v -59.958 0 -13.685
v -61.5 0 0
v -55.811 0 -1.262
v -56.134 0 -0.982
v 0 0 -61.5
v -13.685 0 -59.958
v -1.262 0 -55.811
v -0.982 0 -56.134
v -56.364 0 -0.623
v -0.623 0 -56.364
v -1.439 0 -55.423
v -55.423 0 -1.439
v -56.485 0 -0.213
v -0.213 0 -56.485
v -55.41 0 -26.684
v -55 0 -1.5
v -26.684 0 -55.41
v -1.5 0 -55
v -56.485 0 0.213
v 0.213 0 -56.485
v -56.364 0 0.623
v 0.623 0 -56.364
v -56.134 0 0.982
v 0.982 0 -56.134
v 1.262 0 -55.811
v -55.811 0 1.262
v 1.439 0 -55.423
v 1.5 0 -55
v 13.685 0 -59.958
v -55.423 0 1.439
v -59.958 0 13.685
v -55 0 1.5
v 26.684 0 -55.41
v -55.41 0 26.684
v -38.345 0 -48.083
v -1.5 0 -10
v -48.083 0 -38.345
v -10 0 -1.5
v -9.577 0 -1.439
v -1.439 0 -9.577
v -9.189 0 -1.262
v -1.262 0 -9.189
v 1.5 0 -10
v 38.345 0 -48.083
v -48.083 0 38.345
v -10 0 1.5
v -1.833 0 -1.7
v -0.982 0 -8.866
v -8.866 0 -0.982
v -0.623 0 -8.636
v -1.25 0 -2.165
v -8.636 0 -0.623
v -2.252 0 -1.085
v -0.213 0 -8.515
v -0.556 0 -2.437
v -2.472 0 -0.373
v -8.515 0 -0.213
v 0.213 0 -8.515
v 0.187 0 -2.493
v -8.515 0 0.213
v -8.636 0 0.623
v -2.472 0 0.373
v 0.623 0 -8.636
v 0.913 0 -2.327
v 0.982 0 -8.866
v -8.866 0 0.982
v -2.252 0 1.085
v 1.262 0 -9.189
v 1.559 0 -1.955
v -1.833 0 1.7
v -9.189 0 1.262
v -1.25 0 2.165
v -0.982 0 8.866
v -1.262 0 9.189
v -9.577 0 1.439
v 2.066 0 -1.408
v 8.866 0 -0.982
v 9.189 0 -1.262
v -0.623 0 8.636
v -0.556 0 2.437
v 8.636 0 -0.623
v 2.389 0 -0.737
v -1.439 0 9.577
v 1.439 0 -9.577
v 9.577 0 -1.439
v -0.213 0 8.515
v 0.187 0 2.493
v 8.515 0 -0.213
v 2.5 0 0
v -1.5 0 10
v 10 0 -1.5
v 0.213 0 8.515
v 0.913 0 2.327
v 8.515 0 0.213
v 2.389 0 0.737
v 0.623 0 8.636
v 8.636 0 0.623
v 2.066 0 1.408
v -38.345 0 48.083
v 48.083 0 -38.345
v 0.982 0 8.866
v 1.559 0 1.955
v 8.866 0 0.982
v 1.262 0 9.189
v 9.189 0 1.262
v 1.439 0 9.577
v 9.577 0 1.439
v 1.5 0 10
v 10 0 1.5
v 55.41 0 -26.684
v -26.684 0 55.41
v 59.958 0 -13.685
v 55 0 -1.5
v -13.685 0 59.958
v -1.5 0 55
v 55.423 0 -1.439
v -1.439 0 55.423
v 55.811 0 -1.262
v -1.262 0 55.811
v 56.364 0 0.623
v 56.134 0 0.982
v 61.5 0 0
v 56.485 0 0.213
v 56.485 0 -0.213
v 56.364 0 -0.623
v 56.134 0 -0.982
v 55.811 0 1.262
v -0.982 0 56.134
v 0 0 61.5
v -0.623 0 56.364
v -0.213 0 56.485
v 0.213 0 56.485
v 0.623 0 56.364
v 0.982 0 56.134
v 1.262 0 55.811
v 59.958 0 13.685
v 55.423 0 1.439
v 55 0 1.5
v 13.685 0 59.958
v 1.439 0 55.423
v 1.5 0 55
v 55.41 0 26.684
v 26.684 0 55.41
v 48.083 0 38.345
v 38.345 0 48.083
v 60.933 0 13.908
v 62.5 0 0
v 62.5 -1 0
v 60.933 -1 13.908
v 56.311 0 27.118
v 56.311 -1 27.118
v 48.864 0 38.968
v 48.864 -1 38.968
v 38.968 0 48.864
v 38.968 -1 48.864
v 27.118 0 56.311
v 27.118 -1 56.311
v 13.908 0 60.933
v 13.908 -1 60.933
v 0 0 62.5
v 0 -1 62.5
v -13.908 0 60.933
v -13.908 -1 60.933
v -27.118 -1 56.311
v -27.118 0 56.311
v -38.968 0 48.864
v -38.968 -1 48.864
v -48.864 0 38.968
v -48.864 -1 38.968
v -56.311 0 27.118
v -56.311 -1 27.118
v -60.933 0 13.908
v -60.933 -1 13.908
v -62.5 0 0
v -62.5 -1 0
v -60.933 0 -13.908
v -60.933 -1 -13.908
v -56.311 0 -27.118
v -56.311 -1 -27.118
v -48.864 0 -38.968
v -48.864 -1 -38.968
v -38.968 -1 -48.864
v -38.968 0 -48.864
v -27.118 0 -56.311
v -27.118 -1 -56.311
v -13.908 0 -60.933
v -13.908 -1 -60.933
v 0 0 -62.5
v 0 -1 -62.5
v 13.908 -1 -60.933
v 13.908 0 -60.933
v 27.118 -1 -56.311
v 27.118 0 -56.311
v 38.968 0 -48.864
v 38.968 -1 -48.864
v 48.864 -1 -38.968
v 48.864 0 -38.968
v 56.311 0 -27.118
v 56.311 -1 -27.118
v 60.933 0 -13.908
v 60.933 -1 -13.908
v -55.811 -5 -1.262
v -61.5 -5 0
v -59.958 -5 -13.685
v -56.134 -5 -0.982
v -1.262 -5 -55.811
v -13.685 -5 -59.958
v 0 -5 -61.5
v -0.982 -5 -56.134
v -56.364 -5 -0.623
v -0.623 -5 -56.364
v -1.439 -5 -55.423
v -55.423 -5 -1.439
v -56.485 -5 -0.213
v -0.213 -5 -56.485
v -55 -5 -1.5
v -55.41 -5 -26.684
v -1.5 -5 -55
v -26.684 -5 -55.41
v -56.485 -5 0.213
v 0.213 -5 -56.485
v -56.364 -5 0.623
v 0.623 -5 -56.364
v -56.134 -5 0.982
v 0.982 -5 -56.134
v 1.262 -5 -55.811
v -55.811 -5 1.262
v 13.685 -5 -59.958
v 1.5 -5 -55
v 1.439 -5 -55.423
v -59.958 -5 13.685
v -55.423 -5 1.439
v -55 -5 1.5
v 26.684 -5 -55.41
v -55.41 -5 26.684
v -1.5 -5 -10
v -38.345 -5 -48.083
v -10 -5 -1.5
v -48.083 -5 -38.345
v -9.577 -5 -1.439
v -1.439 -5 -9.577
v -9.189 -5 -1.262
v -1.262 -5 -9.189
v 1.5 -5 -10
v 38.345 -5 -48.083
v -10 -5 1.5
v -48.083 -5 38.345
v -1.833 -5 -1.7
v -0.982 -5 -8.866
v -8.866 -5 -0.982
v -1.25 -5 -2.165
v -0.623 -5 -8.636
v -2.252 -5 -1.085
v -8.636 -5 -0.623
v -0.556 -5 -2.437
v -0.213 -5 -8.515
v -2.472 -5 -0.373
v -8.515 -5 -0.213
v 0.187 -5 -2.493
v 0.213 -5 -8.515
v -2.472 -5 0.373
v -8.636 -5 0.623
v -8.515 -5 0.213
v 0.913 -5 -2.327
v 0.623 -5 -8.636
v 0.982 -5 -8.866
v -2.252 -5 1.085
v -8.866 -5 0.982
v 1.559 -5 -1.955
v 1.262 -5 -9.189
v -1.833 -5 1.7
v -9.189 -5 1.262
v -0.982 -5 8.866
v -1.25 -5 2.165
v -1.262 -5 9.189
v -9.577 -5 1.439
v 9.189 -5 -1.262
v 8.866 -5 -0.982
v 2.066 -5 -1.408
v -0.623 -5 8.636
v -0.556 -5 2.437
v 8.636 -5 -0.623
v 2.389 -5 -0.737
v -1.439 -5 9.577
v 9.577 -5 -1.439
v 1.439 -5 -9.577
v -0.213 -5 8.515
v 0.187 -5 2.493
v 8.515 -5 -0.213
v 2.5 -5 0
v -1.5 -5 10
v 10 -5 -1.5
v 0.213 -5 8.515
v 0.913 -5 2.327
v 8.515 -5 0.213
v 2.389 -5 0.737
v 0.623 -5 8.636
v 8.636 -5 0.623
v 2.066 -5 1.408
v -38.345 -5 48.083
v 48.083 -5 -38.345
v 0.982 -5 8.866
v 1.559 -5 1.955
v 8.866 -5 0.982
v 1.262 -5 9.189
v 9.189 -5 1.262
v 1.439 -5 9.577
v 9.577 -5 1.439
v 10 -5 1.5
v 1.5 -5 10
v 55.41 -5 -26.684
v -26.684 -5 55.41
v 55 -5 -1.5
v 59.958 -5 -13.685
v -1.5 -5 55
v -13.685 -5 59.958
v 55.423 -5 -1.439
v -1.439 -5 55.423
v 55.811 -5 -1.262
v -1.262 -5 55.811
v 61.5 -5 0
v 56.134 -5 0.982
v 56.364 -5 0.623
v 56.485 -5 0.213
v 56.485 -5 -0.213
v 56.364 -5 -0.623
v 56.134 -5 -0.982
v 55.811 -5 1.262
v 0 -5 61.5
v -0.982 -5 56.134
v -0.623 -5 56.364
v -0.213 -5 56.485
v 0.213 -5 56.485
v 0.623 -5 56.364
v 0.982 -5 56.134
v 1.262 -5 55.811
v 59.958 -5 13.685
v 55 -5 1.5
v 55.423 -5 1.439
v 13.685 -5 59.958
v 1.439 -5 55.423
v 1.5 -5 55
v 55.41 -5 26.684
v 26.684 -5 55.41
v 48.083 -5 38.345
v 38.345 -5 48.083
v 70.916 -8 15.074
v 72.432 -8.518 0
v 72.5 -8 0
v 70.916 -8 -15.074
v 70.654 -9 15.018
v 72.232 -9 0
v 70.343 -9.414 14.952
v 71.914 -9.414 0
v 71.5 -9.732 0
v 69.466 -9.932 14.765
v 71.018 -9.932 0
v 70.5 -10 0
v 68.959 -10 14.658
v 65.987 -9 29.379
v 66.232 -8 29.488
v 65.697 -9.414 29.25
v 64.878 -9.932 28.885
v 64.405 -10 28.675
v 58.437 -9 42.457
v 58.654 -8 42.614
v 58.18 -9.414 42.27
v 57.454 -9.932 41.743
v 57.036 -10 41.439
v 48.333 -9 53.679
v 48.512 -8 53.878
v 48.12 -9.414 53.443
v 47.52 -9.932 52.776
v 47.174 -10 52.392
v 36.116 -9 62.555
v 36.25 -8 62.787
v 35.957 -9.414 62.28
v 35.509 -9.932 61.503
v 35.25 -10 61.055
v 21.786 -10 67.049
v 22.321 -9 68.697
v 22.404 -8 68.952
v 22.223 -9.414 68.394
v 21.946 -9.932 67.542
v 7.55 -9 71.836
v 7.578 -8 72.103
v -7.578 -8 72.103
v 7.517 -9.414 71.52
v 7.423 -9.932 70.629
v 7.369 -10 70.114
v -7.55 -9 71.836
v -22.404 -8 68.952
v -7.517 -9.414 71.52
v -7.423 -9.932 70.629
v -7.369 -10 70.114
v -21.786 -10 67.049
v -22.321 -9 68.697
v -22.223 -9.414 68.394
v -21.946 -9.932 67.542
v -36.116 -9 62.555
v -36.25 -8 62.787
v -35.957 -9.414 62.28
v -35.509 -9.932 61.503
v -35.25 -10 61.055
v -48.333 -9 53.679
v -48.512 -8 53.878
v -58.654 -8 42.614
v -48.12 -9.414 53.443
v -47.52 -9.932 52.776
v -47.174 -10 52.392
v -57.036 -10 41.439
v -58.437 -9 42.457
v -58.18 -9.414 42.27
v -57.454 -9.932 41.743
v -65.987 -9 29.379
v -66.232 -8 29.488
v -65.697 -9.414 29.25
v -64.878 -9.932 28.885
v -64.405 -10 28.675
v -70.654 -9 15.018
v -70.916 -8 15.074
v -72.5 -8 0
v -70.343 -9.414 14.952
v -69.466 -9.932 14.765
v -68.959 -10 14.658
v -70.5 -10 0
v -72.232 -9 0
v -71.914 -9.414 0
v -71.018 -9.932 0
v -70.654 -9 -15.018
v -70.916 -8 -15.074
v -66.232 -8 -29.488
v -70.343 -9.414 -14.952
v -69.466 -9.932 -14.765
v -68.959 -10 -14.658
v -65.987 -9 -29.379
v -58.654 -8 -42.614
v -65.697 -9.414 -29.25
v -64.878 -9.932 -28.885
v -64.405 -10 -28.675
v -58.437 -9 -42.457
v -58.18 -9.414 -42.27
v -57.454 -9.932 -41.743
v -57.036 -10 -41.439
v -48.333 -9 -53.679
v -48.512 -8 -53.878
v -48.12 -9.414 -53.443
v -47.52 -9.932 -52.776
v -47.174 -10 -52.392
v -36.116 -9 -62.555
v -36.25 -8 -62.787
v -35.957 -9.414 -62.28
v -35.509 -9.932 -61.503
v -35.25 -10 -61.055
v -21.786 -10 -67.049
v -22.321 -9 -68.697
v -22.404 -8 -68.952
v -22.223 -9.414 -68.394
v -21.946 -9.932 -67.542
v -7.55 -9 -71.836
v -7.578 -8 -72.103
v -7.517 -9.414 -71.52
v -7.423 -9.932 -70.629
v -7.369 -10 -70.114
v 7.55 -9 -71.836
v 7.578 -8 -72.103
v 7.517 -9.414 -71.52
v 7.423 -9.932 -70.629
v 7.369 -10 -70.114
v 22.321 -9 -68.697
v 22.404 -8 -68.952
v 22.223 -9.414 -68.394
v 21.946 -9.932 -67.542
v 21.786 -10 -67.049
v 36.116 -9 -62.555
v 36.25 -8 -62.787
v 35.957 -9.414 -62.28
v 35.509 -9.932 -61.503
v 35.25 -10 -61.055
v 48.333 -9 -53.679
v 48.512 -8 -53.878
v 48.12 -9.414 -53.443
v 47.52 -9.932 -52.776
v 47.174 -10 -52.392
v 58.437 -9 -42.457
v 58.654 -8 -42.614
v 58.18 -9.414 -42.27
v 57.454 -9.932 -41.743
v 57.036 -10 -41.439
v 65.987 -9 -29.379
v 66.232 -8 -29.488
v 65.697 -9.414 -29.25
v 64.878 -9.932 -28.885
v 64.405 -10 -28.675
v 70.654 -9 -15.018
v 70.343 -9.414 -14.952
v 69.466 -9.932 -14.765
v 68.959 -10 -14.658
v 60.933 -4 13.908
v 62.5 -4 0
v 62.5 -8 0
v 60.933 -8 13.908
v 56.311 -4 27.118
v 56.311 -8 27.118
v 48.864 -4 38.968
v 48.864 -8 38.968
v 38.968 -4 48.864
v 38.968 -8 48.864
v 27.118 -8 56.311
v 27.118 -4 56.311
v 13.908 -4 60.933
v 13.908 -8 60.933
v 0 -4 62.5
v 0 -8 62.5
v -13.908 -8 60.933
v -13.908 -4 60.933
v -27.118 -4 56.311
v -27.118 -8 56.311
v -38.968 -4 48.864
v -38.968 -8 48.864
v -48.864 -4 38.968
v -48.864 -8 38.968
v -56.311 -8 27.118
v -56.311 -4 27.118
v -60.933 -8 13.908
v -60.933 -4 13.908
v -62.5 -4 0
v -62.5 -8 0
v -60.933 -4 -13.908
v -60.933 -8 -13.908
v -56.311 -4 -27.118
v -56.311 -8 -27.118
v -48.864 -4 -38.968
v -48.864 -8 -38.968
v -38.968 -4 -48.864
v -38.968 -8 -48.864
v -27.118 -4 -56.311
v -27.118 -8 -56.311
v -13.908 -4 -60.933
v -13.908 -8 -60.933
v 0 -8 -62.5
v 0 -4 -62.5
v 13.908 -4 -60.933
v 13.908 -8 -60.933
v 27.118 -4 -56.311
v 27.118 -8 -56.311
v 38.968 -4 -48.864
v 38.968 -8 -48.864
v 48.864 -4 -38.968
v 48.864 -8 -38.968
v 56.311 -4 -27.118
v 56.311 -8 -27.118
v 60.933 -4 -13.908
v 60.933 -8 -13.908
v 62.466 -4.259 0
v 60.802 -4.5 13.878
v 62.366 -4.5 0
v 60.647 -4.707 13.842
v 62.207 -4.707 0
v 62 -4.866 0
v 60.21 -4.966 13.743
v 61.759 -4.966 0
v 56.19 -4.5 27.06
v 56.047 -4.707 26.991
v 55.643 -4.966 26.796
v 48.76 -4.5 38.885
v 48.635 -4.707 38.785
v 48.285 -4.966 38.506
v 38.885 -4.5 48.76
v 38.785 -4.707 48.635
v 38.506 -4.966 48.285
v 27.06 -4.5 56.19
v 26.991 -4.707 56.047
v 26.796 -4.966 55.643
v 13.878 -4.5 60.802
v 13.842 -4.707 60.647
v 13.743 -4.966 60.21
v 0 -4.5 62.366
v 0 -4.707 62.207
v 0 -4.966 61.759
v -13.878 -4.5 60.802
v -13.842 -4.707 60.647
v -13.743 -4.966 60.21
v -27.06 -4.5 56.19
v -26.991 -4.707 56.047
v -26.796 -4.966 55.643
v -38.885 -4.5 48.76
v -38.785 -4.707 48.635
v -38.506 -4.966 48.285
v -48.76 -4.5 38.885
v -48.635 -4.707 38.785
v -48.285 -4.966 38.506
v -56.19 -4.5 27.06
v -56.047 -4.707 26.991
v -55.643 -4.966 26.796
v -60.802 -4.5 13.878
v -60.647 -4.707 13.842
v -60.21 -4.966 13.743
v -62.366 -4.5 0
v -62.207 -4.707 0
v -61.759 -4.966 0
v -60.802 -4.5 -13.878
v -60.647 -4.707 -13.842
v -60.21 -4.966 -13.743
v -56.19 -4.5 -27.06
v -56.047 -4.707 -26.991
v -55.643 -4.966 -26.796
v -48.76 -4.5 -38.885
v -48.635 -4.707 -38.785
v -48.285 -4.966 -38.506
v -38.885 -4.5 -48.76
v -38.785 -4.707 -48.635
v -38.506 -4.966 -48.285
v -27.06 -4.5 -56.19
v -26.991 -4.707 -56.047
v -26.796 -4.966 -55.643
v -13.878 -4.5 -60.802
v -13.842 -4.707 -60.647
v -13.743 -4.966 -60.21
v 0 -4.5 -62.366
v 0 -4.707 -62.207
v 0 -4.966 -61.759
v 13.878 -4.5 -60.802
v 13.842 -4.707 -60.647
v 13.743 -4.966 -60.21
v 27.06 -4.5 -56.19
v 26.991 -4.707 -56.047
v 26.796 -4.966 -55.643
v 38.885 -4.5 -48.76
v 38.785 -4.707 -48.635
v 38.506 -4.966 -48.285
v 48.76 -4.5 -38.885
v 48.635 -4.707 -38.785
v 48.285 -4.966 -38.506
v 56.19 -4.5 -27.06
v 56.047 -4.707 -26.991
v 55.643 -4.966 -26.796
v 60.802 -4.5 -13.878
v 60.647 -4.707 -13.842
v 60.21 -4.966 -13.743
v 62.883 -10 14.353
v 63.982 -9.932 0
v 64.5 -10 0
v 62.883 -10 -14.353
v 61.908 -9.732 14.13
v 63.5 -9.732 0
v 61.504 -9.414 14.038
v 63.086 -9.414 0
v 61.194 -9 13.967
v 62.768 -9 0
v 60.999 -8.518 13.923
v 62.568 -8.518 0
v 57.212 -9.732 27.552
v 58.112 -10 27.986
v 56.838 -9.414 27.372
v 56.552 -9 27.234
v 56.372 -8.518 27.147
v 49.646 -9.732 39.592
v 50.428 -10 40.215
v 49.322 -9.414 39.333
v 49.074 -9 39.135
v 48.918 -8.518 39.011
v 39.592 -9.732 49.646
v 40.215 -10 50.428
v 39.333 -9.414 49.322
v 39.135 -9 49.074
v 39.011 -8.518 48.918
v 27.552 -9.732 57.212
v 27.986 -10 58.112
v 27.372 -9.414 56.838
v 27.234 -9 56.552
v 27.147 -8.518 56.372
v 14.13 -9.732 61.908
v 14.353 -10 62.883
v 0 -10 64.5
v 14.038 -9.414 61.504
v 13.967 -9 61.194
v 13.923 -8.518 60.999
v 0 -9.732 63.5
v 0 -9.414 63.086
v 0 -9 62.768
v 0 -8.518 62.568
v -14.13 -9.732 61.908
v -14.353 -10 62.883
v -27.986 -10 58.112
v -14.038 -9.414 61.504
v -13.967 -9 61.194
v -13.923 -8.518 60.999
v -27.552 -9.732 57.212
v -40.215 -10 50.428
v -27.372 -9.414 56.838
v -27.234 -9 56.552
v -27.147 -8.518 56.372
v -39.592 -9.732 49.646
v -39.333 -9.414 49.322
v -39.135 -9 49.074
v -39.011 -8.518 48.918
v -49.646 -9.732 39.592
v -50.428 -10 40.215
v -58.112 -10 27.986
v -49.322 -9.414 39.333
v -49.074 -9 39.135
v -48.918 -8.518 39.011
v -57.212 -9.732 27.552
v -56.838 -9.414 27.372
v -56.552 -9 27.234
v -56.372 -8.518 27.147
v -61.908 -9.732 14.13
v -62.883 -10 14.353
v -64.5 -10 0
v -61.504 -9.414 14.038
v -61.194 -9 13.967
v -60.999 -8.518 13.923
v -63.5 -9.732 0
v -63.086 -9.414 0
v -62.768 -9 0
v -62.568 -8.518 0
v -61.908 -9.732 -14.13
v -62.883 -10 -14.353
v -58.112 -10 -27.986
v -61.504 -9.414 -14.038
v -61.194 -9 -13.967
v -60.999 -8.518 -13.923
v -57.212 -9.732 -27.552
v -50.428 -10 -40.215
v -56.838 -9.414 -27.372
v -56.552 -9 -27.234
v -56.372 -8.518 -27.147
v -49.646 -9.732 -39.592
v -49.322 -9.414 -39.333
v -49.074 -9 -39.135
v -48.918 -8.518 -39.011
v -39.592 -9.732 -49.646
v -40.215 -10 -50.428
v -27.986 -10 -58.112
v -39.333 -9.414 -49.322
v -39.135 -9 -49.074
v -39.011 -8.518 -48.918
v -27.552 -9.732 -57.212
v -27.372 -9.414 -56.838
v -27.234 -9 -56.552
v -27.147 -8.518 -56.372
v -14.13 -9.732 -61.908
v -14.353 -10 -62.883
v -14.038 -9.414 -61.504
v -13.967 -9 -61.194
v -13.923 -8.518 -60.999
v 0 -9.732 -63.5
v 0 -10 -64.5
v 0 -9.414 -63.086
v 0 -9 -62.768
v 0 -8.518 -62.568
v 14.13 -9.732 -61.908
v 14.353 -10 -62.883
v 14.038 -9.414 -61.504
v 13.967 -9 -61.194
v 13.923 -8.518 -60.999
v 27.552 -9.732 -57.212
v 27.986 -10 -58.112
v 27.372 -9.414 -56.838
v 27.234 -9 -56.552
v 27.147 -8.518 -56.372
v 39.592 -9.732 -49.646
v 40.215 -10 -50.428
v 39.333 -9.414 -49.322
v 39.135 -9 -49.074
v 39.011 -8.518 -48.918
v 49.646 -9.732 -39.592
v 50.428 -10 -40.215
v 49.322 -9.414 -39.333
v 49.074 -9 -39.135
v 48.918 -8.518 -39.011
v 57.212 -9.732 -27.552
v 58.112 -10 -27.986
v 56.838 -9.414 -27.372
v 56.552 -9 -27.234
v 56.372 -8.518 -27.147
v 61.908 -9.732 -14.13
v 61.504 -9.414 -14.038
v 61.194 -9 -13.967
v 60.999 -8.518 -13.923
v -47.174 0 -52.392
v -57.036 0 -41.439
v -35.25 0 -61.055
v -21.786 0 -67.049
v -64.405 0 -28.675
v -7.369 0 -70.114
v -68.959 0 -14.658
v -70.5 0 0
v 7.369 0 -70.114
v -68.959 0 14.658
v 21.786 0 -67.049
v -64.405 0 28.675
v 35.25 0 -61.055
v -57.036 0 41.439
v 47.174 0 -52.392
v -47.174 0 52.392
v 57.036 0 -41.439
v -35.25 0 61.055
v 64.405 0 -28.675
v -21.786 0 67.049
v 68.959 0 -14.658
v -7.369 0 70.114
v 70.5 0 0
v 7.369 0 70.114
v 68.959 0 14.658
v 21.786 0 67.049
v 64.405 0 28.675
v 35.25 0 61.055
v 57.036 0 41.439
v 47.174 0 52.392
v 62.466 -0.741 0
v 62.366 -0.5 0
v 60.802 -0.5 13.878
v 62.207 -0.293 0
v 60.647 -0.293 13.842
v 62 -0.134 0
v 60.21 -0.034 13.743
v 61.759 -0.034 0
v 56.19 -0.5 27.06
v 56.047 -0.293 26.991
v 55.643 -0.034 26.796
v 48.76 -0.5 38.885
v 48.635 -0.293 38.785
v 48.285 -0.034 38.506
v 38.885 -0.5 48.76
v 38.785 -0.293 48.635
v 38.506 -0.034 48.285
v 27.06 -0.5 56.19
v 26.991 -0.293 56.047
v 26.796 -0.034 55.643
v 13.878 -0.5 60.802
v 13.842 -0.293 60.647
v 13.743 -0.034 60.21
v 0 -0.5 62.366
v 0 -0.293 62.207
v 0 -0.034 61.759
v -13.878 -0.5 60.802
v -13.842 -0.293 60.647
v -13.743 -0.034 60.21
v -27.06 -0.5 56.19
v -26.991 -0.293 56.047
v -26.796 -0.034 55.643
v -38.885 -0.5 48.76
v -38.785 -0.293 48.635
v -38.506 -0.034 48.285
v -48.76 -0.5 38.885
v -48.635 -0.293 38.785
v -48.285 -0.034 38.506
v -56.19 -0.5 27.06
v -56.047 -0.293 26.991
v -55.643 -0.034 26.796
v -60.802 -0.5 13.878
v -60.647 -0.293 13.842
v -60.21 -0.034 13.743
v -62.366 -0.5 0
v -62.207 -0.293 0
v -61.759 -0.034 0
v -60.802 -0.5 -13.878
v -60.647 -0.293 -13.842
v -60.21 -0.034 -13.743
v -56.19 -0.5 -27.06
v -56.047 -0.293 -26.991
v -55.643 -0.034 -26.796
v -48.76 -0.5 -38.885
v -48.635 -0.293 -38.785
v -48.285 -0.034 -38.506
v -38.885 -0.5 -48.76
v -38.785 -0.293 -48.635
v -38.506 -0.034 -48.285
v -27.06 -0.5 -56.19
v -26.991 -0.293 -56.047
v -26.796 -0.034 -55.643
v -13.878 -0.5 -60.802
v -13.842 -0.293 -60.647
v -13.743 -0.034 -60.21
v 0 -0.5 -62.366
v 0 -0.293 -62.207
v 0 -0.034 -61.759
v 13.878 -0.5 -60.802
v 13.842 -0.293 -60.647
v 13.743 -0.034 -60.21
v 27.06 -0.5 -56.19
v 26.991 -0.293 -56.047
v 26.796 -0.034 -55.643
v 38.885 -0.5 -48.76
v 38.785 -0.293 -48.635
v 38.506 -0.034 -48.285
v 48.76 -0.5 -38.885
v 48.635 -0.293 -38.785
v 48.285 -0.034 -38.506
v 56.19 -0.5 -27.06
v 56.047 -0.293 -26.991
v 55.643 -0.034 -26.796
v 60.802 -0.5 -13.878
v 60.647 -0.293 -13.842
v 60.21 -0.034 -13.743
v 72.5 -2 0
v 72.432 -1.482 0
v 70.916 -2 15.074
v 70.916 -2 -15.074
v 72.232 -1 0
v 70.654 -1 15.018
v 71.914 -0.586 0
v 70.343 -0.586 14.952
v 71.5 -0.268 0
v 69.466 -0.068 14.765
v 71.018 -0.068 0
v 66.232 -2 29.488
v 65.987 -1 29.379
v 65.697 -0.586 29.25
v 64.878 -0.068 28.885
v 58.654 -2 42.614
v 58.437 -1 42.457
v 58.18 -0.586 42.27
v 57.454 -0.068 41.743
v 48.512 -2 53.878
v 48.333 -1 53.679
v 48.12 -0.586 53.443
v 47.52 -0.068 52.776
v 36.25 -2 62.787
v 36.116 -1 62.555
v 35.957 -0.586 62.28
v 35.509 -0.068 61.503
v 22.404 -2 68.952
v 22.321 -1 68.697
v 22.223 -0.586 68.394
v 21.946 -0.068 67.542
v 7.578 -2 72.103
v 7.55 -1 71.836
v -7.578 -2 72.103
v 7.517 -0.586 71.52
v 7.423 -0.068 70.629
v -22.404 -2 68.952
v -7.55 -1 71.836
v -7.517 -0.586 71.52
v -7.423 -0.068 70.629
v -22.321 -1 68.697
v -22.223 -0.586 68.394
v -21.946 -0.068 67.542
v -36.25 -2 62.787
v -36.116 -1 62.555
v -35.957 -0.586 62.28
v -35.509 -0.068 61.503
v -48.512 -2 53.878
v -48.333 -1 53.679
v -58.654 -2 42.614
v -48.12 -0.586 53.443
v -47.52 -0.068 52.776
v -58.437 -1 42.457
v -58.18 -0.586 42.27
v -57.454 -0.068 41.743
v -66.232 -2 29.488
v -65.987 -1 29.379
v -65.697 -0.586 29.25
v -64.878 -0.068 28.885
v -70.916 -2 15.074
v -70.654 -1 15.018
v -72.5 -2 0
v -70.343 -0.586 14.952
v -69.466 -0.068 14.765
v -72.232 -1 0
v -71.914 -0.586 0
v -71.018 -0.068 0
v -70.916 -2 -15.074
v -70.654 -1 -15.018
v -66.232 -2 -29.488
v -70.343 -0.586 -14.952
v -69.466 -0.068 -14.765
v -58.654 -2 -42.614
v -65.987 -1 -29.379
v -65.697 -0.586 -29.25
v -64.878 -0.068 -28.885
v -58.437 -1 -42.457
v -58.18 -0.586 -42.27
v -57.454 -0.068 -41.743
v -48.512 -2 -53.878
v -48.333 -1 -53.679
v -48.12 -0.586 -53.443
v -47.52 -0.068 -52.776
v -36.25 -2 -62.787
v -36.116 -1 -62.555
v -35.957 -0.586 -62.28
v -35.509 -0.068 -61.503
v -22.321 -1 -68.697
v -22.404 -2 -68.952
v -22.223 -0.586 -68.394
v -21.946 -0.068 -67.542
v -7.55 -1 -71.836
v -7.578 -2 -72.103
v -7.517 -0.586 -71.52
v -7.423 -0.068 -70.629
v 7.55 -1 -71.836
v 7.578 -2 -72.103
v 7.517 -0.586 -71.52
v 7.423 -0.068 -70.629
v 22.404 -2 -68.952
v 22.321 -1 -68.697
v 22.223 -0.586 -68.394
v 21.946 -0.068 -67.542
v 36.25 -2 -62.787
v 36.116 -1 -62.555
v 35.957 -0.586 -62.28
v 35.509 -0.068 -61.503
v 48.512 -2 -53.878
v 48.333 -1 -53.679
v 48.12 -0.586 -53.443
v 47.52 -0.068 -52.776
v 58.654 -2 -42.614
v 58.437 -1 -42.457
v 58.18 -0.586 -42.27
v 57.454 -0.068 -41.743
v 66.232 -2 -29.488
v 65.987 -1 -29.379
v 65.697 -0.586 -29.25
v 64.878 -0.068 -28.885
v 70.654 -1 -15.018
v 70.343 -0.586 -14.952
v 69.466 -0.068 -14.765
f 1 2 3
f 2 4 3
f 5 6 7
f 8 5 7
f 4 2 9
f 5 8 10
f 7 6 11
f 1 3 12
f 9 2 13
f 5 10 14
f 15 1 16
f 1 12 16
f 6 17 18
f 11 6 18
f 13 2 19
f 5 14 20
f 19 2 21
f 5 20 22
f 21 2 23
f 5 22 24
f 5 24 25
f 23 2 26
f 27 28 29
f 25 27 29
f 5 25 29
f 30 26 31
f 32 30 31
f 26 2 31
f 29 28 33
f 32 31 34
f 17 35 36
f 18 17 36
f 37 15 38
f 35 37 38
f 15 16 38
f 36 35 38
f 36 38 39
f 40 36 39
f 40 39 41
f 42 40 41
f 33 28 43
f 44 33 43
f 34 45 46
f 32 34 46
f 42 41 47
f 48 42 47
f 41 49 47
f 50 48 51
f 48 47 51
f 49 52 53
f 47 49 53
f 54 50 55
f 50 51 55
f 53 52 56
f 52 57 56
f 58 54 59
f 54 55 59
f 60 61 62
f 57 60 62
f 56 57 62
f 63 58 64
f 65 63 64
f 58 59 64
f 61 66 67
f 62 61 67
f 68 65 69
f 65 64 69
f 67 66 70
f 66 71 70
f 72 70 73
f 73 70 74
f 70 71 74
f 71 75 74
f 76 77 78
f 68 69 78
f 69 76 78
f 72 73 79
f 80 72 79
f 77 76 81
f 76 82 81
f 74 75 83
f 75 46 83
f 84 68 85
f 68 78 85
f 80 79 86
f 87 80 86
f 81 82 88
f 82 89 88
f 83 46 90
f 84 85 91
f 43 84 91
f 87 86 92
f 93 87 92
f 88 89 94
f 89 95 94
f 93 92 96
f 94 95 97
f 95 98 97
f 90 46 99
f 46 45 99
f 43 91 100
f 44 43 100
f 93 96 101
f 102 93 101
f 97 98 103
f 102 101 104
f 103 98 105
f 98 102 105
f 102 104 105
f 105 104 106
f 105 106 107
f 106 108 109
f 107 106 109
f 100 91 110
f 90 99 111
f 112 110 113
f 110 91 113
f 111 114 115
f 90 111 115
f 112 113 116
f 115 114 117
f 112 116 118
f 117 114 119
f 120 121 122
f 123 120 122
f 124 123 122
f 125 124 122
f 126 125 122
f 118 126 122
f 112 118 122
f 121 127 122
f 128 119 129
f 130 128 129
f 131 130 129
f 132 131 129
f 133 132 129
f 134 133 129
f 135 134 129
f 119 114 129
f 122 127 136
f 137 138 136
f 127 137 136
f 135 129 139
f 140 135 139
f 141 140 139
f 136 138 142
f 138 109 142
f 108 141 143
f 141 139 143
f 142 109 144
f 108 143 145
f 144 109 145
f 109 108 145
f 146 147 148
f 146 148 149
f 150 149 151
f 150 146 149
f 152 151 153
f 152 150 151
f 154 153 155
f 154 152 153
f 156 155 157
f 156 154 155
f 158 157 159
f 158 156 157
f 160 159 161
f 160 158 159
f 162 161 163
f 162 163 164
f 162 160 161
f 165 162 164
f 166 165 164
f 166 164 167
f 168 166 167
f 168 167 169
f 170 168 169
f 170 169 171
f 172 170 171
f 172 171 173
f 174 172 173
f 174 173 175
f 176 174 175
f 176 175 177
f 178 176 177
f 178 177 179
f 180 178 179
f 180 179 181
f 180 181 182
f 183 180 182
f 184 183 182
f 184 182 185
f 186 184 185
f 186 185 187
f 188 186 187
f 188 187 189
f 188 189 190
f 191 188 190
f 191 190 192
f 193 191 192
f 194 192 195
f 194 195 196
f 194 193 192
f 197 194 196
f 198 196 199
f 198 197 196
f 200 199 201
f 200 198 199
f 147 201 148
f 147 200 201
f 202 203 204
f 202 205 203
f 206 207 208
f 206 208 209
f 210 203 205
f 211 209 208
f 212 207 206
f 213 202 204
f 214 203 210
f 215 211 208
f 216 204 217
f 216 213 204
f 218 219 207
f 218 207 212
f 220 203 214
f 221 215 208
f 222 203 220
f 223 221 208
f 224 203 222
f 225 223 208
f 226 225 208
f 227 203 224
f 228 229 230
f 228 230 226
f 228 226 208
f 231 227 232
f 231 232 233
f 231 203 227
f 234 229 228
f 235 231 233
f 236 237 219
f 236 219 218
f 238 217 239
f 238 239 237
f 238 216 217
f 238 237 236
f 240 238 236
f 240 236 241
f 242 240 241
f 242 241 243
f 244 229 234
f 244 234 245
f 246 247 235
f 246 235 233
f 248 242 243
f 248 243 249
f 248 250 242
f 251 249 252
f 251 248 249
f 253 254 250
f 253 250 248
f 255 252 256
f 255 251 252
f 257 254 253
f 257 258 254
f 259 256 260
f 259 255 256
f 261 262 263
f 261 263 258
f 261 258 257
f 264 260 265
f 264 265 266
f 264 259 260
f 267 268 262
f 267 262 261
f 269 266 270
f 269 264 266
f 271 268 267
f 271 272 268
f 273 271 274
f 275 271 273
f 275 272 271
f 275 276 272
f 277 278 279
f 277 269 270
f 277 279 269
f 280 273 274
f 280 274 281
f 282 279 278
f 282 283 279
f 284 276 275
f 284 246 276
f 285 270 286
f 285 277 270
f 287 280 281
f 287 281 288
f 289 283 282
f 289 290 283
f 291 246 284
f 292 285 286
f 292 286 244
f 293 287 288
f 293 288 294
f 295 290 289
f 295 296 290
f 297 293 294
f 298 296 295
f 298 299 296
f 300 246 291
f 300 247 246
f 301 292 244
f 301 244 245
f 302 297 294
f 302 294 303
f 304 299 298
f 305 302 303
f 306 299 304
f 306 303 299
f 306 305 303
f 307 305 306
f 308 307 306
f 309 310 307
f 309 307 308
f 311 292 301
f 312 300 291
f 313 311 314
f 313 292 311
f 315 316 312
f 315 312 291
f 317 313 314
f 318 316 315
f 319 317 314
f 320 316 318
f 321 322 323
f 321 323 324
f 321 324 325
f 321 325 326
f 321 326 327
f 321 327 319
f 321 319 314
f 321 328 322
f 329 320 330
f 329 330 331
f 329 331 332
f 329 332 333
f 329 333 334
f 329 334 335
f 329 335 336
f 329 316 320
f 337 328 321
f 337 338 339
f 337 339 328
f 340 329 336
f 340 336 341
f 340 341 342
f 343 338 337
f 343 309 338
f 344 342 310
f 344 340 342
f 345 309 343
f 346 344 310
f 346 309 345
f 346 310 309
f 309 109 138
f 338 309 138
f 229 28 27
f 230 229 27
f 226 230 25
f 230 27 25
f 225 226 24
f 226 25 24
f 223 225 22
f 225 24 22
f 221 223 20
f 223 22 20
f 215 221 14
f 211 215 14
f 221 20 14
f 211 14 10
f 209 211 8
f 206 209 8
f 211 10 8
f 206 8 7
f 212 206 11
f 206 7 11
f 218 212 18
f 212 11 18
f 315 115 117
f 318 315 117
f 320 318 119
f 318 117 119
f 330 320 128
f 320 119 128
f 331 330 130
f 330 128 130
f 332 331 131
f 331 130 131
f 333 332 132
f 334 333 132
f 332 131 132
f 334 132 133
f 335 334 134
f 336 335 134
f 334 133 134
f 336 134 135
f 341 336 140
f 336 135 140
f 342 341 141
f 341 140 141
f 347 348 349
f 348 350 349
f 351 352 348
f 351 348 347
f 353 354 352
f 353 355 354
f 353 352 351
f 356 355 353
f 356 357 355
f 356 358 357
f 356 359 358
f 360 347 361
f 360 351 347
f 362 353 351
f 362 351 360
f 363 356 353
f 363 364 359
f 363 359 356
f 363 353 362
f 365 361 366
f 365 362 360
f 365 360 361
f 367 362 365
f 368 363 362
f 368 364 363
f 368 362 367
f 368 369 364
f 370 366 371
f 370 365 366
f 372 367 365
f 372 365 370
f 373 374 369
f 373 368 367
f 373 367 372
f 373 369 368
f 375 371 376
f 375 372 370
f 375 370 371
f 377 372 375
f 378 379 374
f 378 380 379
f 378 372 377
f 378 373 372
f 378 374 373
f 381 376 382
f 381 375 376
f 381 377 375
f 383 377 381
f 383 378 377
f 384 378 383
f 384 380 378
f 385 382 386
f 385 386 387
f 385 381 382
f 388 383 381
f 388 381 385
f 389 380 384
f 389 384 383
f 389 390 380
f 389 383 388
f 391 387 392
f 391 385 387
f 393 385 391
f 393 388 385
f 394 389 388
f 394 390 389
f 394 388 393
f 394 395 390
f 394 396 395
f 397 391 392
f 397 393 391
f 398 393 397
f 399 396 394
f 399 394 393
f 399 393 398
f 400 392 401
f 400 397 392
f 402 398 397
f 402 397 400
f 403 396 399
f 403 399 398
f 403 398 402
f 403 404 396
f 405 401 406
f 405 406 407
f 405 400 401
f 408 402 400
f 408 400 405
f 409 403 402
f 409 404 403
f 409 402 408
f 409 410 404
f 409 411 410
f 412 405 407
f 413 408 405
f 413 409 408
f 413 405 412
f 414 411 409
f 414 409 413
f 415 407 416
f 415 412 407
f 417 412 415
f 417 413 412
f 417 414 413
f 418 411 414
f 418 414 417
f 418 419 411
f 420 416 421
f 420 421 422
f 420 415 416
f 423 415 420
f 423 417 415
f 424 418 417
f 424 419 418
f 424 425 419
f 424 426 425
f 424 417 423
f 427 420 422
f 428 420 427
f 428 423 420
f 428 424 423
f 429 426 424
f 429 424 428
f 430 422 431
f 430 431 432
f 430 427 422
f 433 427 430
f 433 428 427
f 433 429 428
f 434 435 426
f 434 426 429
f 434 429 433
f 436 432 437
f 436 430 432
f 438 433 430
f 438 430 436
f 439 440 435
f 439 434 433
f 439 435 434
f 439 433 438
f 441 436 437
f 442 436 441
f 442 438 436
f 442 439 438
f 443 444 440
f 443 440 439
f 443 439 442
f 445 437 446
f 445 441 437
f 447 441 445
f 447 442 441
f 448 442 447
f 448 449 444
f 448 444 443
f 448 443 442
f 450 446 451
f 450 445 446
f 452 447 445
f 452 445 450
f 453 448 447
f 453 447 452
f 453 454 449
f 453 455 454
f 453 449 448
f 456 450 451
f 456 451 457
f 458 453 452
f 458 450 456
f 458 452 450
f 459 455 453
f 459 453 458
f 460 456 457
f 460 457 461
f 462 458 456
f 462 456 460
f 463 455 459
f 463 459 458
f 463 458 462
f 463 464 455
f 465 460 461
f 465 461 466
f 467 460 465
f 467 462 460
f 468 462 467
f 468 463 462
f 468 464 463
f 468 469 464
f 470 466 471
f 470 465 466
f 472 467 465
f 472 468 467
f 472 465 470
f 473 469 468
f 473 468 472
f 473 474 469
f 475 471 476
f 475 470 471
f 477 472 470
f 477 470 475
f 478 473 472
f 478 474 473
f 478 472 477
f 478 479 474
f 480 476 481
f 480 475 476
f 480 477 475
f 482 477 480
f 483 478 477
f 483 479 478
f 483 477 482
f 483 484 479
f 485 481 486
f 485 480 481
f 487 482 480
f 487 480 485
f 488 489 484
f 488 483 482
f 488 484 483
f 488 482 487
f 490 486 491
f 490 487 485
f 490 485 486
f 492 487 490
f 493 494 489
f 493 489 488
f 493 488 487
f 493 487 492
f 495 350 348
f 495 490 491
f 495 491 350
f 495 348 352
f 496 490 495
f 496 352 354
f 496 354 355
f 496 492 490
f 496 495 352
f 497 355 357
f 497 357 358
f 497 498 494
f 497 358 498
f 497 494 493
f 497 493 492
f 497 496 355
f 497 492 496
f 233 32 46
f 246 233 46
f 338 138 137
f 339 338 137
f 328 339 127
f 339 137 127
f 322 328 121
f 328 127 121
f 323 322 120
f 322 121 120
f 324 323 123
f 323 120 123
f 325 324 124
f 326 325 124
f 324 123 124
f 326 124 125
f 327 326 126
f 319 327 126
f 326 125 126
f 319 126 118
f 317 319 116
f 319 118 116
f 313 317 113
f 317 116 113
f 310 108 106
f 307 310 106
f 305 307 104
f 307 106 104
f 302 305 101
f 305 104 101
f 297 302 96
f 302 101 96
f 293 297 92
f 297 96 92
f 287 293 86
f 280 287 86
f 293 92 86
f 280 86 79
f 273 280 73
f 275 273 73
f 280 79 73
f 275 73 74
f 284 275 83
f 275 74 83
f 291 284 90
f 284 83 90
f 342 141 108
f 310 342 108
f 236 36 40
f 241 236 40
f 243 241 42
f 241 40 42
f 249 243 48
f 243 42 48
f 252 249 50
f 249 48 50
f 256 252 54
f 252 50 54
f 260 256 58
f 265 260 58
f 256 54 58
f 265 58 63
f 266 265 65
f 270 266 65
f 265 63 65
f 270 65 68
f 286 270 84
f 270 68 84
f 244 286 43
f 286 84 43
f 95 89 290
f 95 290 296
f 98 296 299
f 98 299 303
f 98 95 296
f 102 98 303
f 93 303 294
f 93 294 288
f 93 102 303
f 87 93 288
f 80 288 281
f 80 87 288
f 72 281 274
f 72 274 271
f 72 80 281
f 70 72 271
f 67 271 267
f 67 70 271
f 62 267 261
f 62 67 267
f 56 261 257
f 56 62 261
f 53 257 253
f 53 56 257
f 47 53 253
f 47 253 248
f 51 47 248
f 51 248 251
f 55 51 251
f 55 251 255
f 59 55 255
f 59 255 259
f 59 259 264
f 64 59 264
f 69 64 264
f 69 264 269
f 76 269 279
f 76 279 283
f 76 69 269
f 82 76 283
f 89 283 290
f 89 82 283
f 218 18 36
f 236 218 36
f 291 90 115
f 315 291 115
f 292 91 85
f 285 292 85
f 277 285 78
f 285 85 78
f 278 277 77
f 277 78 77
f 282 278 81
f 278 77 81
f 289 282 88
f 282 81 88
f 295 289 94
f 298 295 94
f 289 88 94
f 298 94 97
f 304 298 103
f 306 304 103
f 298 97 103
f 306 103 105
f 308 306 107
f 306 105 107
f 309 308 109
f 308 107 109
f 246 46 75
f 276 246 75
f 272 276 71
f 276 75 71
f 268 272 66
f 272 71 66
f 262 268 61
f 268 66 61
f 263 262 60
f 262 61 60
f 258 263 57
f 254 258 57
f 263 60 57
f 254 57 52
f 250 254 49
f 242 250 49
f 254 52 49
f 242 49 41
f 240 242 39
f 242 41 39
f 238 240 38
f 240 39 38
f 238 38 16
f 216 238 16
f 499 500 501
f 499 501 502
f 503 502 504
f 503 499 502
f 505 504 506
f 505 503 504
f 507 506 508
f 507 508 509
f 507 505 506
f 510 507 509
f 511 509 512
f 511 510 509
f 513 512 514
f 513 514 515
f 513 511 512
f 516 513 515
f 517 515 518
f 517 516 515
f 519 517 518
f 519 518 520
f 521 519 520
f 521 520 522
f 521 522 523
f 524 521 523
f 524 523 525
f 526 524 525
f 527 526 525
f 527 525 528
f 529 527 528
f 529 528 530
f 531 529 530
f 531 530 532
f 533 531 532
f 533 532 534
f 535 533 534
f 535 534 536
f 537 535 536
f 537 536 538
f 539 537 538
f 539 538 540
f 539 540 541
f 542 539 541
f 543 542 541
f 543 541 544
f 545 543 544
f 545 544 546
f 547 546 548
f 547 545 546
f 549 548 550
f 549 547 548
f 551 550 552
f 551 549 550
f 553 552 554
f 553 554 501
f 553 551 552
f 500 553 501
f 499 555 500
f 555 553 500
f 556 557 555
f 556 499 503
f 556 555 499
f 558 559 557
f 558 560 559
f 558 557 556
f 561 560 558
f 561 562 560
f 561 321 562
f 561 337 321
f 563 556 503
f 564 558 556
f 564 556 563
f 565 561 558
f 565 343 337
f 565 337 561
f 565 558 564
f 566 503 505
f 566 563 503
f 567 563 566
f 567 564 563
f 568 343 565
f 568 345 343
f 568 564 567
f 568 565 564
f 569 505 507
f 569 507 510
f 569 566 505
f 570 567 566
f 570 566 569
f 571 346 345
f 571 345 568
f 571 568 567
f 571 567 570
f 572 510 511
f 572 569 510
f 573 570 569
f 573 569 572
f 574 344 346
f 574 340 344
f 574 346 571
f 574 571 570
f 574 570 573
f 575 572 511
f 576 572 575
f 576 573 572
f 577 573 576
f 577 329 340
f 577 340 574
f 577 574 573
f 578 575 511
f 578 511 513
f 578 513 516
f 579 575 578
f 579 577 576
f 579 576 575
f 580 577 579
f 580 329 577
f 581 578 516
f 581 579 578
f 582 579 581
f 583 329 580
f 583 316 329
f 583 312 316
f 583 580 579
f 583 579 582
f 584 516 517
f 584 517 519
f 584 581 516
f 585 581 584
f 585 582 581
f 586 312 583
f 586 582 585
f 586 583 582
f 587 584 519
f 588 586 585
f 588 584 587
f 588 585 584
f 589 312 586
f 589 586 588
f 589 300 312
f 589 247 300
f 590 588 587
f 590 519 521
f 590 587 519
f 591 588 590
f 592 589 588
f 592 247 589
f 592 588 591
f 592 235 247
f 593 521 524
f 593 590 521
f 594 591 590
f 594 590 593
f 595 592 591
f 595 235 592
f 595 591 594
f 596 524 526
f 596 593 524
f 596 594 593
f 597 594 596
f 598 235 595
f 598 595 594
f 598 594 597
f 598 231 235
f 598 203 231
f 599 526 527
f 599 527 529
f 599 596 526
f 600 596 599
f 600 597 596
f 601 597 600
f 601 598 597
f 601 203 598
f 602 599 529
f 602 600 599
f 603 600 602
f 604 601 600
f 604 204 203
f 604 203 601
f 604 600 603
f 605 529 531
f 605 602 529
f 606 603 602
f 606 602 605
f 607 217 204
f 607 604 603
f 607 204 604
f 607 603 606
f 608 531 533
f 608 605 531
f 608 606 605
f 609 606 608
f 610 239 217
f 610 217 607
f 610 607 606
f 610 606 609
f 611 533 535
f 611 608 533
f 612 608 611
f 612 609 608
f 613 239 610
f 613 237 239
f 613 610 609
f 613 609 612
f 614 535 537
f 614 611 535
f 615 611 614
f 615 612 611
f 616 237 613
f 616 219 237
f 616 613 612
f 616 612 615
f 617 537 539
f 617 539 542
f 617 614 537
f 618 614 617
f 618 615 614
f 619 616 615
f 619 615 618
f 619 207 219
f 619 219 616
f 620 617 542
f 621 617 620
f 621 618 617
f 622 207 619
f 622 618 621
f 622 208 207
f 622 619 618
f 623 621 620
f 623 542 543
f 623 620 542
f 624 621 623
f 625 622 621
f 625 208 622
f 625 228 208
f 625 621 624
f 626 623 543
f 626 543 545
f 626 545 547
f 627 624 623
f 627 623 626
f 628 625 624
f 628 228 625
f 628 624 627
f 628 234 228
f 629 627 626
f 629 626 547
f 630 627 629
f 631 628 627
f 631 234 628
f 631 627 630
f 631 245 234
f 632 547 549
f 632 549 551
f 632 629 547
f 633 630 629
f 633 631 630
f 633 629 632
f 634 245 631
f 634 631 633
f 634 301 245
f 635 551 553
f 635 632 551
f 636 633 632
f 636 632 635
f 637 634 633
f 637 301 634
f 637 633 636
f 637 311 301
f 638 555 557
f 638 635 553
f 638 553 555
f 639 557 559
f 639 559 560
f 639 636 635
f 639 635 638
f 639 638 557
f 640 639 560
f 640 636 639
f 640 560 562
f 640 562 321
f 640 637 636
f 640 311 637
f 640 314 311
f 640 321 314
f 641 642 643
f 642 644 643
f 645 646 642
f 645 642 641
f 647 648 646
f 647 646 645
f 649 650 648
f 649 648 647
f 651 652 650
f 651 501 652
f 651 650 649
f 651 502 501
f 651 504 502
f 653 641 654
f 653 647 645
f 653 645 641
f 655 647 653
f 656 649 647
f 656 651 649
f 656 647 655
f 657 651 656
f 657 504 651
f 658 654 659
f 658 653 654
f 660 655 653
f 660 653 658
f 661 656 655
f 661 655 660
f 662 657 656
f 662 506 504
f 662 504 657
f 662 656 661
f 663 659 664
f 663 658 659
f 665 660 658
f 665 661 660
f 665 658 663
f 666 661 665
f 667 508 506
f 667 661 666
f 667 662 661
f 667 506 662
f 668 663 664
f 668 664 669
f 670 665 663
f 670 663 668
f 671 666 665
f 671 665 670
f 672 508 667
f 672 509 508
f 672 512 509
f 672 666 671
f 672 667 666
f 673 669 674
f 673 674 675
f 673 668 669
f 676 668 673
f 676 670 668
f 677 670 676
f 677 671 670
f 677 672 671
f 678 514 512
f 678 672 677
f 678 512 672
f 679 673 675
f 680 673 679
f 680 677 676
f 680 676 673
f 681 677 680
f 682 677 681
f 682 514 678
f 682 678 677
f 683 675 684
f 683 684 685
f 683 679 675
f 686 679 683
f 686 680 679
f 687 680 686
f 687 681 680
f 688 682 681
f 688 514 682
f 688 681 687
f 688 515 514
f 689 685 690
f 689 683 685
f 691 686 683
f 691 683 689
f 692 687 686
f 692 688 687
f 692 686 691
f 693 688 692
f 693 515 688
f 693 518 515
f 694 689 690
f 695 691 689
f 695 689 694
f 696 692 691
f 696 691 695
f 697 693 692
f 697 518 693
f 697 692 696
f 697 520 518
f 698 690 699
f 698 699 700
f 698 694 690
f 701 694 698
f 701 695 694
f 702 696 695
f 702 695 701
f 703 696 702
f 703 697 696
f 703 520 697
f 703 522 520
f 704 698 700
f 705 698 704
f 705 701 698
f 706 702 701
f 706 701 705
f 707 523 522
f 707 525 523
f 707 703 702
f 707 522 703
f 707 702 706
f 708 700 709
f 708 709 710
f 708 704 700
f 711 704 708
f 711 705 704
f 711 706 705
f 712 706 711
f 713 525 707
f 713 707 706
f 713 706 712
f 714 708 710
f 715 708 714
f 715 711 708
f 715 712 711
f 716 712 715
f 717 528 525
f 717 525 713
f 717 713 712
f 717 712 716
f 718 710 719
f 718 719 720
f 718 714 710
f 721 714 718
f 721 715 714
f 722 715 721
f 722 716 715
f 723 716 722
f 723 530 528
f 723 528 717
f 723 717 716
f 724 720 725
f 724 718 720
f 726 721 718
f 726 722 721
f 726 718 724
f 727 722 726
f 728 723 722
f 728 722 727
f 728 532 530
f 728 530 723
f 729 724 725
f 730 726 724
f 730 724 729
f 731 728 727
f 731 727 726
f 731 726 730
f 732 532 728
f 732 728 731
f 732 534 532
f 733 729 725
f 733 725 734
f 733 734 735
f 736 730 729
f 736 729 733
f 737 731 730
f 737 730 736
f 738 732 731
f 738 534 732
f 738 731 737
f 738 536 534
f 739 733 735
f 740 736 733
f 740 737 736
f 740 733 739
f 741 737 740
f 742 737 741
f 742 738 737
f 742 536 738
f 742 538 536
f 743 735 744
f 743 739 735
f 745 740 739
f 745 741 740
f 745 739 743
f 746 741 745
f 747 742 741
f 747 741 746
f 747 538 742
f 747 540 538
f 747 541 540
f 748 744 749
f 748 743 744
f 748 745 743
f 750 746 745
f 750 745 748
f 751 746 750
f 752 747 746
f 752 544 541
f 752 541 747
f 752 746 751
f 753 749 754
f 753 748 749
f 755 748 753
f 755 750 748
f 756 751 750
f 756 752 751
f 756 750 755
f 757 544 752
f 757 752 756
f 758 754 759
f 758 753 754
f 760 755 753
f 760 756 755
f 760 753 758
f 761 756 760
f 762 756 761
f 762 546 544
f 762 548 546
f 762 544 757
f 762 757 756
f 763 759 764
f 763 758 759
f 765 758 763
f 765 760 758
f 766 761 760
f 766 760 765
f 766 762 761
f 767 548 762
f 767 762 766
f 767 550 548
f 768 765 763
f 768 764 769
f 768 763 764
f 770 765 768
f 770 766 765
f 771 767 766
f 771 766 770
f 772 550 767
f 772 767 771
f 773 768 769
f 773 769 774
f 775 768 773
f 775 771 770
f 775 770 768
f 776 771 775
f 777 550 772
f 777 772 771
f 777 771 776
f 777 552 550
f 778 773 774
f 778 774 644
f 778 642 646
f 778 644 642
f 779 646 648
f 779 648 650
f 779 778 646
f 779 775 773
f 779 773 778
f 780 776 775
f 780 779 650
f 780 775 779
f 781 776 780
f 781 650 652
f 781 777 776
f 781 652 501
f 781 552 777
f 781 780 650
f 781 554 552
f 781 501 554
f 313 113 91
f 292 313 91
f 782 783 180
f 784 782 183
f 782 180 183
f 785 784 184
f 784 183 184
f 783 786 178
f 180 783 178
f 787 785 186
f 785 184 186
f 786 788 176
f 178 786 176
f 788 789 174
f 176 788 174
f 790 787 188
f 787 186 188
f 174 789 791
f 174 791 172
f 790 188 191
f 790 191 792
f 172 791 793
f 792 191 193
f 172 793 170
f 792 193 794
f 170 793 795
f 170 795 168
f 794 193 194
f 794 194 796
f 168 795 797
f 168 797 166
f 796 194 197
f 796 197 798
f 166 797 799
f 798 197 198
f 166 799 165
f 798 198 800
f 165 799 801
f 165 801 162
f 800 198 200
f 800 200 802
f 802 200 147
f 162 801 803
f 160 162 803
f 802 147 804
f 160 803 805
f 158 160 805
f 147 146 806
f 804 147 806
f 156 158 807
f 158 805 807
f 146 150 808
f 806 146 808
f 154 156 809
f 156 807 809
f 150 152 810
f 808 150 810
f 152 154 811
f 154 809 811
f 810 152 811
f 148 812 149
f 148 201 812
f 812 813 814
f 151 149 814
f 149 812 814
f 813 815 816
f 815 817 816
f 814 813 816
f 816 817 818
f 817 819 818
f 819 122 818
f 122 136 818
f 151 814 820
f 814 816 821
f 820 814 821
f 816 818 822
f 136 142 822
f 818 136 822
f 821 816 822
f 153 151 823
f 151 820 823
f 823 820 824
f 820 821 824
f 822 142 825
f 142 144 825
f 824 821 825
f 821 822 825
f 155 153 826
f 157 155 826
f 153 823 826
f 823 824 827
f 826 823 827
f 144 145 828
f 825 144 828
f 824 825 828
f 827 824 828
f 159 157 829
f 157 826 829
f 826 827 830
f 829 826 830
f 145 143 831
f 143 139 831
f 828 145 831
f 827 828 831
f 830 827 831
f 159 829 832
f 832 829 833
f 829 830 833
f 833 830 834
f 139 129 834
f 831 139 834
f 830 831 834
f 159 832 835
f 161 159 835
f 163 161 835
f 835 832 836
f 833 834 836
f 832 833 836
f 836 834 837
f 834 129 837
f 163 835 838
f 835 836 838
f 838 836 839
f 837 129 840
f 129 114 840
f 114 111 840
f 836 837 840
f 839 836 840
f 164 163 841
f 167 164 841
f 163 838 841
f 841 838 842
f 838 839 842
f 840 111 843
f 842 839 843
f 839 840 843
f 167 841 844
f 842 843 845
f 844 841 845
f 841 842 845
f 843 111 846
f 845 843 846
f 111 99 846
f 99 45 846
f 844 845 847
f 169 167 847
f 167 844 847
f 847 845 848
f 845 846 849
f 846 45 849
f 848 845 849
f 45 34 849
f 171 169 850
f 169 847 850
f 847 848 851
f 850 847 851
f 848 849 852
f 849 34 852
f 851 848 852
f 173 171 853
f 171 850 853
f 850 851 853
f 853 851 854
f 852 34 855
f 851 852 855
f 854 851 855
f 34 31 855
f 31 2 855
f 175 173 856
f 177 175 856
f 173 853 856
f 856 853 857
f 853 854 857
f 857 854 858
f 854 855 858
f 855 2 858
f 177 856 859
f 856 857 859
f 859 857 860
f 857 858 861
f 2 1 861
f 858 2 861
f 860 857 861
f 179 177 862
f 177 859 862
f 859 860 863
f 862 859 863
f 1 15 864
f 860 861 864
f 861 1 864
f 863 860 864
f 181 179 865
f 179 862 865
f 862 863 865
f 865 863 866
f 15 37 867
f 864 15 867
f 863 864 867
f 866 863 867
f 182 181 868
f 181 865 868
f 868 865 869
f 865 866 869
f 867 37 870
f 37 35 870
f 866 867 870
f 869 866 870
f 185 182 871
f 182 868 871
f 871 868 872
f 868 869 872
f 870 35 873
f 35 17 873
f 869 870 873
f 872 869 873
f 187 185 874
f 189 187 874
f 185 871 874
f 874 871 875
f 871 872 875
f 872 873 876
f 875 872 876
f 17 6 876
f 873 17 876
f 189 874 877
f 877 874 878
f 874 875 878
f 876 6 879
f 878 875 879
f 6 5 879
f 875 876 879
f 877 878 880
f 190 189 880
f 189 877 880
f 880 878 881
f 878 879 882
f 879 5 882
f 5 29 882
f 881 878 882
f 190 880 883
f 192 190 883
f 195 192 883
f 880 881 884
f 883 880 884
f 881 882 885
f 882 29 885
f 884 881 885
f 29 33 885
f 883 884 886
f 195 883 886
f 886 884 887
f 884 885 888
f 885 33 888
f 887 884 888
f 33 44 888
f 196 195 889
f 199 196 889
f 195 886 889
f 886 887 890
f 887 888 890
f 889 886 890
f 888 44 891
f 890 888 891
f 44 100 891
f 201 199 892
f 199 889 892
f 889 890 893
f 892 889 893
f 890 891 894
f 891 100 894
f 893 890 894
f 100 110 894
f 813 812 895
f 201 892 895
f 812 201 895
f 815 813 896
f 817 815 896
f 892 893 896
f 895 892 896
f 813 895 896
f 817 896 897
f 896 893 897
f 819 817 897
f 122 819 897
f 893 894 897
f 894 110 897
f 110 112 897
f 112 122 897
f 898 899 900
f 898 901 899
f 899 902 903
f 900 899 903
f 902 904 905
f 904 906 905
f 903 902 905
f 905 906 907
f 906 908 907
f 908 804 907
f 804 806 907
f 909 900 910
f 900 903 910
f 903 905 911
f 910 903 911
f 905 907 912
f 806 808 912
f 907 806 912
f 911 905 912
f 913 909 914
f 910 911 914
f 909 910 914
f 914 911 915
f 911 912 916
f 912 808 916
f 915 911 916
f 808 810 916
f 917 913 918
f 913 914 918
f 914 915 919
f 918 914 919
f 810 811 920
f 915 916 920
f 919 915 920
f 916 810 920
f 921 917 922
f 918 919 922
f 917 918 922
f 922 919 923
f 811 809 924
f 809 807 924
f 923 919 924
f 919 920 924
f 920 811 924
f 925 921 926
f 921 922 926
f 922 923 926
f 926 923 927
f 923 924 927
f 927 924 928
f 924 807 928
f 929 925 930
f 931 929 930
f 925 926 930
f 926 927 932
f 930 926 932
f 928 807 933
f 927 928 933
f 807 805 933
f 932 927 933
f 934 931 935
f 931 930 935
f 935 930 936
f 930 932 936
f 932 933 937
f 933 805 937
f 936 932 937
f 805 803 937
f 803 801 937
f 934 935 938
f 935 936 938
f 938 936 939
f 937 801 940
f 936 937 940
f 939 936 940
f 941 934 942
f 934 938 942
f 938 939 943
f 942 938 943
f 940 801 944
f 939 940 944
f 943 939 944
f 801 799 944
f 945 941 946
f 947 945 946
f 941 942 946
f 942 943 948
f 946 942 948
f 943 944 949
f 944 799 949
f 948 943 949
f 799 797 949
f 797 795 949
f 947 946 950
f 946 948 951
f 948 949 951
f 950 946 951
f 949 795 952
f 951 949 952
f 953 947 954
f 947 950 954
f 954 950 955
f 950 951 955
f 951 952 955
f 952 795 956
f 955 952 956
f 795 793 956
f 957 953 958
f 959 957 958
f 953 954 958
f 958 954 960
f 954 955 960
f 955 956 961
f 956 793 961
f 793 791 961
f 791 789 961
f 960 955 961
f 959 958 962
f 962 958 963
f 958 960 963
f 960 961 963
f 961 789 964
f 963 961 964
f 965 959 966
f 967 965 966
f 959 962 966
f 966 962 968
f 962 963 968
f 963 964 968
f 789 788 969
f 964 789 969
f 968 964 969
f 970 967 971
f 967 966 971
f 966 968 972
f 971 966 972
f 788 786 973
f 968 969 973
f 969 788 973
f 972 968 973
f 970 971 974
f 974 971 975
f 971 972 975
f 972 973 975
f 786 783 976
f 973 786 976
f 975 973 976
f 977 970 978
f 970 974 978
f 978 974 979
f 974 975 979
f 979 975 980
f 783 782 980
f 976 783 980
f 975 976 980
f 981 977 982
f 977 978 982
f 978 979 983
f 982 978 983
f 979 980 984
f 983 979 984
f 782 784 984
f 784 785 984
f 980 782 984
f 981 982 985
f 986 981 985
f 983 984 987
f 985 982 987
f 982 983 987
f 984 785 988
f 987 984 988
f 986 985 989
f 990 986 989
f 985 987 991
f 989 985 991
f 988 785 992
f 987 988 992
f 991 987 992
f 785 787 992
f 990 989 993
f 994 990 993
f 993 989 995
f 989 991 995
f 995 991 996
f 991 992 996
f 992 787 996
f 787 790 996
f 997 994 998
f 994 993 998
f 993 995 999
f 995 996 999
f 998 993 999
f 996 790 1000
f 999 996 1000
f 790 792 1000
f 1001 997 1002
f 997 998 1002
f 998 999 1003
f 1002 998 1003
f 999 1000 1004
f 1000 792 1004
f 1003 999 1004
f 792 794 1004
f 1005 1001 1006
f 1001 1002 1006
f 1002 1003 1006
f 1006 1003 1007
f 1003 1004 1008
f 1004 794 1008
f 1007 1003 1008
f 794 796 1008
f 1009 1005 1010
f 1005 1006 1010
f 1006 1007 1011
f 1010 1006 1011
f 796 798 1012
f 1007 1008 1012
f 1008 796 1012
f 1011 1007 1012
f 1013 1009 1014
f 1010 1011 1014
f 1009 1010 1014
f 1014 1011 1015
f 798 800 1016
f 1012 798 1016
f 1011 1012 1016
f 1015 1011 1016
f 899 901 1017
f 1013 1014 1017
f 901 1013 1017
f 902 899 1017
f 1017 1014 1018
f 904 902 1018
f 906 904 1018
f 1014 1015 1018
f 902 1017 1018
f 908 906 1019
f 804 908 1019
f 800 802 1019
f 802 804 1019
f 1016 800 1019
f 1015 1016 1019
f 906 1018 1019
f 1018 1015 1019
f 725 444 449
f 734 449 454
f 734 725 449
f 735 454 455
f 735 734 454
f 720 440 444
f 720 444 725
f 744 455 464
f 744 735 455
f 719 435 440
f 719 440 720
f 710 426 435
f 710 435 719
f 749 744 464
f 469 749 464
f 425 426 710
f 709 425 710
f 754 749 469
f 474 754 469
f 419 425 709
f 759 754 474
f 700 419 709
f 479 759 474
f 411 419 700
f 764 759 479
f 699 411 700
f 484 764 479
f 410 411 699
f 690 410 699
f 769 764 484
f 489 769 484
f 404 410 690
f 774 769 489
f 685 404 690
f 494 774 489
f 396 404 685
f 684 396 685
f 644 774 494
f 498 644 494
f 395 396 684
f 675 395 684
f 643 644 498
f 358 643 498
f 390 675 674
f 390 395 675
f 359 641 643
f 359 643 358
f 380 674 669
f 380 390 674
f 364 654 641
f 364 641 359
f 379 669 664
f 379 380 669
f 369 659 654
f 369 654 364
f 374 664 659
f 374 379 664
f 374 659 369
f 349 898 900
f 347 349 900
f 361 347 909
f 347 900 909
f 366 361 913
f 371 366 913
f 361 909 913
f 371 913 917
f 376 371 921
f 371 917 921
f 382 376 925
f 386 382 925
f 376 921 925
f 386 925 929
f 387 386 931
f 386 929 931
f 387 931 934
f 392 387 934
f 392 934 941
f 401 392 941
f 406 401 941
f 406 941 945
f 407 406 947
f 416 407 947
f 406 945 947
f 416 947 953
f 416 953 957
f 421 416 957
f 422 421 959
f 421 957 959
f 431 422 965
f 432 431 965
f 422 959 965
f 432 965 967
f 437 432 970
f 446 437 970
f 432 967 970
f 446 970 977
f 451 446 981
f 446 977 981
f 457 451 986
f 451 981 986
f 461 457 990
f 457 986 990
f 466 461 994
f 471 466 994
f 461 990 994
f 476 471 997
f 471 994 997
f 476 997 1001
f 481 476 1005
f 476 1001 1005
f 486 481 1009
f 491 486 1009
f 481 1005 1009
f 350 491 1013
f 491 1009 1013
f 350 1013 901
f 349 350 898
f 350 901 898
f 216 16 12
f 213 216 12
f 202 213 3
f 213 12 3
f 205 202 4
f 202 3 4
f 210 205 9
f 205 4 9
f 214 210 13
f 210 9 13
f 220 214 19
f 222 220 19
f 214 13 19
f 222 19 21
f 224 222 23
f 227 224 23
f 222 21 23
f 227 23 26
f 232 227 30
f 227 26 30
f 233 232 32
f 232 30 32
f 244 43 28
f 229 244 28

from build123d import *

# Parameters (mm, degrees)
F0_R     = 62.5
F0_R_2   = 2.5
F1_DEPTH = 5
F2_R     = 1
F0_R_3   = 72.5
F3_DEPTH = 10
F4_R     = 2


with BuildPart() as f1:
    # F0 (on Front) → F1 (new body)
    with BuildSketch(Plane.XZ):
        Circle(F0_R)
        with BuildLine():
            ThreePointArc((-1.5, -10), (0, -8.5), (1.5, -10))
            Line((1.5, -10), (1.5, -55))
            ThreePointArc((1.5, -55), (0, -56.5), (-1.5, -55))
            Line((-1.5, -55), (-1.5, -10))
        make_face(mode=Mode.SUBTRACT)
        with BuildLine():
            ThreePointArc((-10, 1.5), (-8.5, 0), (-10, -1.5))
            Line((-10, -1.5), (-55, -1.5))
            ThreePointArc((-55, -1.5), (-56.5, 0), (-55, 1.5))
            Line((-55, 1.5), (-10, 1.5))
        make_face(mode=Mode.SUBTRACT)
        Circle(F0_R_2, mode=Mode.SUBTRACT)
        with BuildLine():
            Line((55, -1.5), (10, -1.5))
            ThreePointArc((10, -1.5), (8.5, 0), (10, 1.5))
            Line((10, 1.5), (55, 1.5))
            ThreePointArc((55, 1.5), (56.5, 0), (55, -1.5))
        make_face(mode=Mode.SUBTRACT)
        with BuildLine():
            Line((1.5, 55), (1.5, 10))
            ThreePointArc((1.5, 10), (0, 8.5), (-1.5, 10))
            Line((-1.5, 10), (-1.5, 55))
            ThreePointArc((-1.5, 55), (0, 56.5), (1.5, 55))
        make_face(mode=Mode.SUBTRACT)
    extrude(amount=F1_DEPTH)

    # F2
    f2_edges = [f1.edges().sort_by_distance(p)[0] for p in [
        (-62.5, -5, 0),
        (-62.5, 0, 0),
    ]]
    fillet(f2_edges, radius=F2_R)

    # F0 (on Front) → F3 (join)
    with BuildSketch(Plane.XZ):
        Circle(F0_R_3)
        Circle(F0_R, mode=Mode.SUBTRACT)
    extrude(amount=F3_DEPTH)

    # F4
    f4_edges = [f1.edges().sort_by_distance(p)[0] for p in [
        (-61.5, -5, 0),
        (-62.5, -10, 0),
        (-72.5, -10, 0),
        (-72.5, 0, 0),
    ]]
    fillet(f4_edges, radius=F4_R)


solid = f1.part
